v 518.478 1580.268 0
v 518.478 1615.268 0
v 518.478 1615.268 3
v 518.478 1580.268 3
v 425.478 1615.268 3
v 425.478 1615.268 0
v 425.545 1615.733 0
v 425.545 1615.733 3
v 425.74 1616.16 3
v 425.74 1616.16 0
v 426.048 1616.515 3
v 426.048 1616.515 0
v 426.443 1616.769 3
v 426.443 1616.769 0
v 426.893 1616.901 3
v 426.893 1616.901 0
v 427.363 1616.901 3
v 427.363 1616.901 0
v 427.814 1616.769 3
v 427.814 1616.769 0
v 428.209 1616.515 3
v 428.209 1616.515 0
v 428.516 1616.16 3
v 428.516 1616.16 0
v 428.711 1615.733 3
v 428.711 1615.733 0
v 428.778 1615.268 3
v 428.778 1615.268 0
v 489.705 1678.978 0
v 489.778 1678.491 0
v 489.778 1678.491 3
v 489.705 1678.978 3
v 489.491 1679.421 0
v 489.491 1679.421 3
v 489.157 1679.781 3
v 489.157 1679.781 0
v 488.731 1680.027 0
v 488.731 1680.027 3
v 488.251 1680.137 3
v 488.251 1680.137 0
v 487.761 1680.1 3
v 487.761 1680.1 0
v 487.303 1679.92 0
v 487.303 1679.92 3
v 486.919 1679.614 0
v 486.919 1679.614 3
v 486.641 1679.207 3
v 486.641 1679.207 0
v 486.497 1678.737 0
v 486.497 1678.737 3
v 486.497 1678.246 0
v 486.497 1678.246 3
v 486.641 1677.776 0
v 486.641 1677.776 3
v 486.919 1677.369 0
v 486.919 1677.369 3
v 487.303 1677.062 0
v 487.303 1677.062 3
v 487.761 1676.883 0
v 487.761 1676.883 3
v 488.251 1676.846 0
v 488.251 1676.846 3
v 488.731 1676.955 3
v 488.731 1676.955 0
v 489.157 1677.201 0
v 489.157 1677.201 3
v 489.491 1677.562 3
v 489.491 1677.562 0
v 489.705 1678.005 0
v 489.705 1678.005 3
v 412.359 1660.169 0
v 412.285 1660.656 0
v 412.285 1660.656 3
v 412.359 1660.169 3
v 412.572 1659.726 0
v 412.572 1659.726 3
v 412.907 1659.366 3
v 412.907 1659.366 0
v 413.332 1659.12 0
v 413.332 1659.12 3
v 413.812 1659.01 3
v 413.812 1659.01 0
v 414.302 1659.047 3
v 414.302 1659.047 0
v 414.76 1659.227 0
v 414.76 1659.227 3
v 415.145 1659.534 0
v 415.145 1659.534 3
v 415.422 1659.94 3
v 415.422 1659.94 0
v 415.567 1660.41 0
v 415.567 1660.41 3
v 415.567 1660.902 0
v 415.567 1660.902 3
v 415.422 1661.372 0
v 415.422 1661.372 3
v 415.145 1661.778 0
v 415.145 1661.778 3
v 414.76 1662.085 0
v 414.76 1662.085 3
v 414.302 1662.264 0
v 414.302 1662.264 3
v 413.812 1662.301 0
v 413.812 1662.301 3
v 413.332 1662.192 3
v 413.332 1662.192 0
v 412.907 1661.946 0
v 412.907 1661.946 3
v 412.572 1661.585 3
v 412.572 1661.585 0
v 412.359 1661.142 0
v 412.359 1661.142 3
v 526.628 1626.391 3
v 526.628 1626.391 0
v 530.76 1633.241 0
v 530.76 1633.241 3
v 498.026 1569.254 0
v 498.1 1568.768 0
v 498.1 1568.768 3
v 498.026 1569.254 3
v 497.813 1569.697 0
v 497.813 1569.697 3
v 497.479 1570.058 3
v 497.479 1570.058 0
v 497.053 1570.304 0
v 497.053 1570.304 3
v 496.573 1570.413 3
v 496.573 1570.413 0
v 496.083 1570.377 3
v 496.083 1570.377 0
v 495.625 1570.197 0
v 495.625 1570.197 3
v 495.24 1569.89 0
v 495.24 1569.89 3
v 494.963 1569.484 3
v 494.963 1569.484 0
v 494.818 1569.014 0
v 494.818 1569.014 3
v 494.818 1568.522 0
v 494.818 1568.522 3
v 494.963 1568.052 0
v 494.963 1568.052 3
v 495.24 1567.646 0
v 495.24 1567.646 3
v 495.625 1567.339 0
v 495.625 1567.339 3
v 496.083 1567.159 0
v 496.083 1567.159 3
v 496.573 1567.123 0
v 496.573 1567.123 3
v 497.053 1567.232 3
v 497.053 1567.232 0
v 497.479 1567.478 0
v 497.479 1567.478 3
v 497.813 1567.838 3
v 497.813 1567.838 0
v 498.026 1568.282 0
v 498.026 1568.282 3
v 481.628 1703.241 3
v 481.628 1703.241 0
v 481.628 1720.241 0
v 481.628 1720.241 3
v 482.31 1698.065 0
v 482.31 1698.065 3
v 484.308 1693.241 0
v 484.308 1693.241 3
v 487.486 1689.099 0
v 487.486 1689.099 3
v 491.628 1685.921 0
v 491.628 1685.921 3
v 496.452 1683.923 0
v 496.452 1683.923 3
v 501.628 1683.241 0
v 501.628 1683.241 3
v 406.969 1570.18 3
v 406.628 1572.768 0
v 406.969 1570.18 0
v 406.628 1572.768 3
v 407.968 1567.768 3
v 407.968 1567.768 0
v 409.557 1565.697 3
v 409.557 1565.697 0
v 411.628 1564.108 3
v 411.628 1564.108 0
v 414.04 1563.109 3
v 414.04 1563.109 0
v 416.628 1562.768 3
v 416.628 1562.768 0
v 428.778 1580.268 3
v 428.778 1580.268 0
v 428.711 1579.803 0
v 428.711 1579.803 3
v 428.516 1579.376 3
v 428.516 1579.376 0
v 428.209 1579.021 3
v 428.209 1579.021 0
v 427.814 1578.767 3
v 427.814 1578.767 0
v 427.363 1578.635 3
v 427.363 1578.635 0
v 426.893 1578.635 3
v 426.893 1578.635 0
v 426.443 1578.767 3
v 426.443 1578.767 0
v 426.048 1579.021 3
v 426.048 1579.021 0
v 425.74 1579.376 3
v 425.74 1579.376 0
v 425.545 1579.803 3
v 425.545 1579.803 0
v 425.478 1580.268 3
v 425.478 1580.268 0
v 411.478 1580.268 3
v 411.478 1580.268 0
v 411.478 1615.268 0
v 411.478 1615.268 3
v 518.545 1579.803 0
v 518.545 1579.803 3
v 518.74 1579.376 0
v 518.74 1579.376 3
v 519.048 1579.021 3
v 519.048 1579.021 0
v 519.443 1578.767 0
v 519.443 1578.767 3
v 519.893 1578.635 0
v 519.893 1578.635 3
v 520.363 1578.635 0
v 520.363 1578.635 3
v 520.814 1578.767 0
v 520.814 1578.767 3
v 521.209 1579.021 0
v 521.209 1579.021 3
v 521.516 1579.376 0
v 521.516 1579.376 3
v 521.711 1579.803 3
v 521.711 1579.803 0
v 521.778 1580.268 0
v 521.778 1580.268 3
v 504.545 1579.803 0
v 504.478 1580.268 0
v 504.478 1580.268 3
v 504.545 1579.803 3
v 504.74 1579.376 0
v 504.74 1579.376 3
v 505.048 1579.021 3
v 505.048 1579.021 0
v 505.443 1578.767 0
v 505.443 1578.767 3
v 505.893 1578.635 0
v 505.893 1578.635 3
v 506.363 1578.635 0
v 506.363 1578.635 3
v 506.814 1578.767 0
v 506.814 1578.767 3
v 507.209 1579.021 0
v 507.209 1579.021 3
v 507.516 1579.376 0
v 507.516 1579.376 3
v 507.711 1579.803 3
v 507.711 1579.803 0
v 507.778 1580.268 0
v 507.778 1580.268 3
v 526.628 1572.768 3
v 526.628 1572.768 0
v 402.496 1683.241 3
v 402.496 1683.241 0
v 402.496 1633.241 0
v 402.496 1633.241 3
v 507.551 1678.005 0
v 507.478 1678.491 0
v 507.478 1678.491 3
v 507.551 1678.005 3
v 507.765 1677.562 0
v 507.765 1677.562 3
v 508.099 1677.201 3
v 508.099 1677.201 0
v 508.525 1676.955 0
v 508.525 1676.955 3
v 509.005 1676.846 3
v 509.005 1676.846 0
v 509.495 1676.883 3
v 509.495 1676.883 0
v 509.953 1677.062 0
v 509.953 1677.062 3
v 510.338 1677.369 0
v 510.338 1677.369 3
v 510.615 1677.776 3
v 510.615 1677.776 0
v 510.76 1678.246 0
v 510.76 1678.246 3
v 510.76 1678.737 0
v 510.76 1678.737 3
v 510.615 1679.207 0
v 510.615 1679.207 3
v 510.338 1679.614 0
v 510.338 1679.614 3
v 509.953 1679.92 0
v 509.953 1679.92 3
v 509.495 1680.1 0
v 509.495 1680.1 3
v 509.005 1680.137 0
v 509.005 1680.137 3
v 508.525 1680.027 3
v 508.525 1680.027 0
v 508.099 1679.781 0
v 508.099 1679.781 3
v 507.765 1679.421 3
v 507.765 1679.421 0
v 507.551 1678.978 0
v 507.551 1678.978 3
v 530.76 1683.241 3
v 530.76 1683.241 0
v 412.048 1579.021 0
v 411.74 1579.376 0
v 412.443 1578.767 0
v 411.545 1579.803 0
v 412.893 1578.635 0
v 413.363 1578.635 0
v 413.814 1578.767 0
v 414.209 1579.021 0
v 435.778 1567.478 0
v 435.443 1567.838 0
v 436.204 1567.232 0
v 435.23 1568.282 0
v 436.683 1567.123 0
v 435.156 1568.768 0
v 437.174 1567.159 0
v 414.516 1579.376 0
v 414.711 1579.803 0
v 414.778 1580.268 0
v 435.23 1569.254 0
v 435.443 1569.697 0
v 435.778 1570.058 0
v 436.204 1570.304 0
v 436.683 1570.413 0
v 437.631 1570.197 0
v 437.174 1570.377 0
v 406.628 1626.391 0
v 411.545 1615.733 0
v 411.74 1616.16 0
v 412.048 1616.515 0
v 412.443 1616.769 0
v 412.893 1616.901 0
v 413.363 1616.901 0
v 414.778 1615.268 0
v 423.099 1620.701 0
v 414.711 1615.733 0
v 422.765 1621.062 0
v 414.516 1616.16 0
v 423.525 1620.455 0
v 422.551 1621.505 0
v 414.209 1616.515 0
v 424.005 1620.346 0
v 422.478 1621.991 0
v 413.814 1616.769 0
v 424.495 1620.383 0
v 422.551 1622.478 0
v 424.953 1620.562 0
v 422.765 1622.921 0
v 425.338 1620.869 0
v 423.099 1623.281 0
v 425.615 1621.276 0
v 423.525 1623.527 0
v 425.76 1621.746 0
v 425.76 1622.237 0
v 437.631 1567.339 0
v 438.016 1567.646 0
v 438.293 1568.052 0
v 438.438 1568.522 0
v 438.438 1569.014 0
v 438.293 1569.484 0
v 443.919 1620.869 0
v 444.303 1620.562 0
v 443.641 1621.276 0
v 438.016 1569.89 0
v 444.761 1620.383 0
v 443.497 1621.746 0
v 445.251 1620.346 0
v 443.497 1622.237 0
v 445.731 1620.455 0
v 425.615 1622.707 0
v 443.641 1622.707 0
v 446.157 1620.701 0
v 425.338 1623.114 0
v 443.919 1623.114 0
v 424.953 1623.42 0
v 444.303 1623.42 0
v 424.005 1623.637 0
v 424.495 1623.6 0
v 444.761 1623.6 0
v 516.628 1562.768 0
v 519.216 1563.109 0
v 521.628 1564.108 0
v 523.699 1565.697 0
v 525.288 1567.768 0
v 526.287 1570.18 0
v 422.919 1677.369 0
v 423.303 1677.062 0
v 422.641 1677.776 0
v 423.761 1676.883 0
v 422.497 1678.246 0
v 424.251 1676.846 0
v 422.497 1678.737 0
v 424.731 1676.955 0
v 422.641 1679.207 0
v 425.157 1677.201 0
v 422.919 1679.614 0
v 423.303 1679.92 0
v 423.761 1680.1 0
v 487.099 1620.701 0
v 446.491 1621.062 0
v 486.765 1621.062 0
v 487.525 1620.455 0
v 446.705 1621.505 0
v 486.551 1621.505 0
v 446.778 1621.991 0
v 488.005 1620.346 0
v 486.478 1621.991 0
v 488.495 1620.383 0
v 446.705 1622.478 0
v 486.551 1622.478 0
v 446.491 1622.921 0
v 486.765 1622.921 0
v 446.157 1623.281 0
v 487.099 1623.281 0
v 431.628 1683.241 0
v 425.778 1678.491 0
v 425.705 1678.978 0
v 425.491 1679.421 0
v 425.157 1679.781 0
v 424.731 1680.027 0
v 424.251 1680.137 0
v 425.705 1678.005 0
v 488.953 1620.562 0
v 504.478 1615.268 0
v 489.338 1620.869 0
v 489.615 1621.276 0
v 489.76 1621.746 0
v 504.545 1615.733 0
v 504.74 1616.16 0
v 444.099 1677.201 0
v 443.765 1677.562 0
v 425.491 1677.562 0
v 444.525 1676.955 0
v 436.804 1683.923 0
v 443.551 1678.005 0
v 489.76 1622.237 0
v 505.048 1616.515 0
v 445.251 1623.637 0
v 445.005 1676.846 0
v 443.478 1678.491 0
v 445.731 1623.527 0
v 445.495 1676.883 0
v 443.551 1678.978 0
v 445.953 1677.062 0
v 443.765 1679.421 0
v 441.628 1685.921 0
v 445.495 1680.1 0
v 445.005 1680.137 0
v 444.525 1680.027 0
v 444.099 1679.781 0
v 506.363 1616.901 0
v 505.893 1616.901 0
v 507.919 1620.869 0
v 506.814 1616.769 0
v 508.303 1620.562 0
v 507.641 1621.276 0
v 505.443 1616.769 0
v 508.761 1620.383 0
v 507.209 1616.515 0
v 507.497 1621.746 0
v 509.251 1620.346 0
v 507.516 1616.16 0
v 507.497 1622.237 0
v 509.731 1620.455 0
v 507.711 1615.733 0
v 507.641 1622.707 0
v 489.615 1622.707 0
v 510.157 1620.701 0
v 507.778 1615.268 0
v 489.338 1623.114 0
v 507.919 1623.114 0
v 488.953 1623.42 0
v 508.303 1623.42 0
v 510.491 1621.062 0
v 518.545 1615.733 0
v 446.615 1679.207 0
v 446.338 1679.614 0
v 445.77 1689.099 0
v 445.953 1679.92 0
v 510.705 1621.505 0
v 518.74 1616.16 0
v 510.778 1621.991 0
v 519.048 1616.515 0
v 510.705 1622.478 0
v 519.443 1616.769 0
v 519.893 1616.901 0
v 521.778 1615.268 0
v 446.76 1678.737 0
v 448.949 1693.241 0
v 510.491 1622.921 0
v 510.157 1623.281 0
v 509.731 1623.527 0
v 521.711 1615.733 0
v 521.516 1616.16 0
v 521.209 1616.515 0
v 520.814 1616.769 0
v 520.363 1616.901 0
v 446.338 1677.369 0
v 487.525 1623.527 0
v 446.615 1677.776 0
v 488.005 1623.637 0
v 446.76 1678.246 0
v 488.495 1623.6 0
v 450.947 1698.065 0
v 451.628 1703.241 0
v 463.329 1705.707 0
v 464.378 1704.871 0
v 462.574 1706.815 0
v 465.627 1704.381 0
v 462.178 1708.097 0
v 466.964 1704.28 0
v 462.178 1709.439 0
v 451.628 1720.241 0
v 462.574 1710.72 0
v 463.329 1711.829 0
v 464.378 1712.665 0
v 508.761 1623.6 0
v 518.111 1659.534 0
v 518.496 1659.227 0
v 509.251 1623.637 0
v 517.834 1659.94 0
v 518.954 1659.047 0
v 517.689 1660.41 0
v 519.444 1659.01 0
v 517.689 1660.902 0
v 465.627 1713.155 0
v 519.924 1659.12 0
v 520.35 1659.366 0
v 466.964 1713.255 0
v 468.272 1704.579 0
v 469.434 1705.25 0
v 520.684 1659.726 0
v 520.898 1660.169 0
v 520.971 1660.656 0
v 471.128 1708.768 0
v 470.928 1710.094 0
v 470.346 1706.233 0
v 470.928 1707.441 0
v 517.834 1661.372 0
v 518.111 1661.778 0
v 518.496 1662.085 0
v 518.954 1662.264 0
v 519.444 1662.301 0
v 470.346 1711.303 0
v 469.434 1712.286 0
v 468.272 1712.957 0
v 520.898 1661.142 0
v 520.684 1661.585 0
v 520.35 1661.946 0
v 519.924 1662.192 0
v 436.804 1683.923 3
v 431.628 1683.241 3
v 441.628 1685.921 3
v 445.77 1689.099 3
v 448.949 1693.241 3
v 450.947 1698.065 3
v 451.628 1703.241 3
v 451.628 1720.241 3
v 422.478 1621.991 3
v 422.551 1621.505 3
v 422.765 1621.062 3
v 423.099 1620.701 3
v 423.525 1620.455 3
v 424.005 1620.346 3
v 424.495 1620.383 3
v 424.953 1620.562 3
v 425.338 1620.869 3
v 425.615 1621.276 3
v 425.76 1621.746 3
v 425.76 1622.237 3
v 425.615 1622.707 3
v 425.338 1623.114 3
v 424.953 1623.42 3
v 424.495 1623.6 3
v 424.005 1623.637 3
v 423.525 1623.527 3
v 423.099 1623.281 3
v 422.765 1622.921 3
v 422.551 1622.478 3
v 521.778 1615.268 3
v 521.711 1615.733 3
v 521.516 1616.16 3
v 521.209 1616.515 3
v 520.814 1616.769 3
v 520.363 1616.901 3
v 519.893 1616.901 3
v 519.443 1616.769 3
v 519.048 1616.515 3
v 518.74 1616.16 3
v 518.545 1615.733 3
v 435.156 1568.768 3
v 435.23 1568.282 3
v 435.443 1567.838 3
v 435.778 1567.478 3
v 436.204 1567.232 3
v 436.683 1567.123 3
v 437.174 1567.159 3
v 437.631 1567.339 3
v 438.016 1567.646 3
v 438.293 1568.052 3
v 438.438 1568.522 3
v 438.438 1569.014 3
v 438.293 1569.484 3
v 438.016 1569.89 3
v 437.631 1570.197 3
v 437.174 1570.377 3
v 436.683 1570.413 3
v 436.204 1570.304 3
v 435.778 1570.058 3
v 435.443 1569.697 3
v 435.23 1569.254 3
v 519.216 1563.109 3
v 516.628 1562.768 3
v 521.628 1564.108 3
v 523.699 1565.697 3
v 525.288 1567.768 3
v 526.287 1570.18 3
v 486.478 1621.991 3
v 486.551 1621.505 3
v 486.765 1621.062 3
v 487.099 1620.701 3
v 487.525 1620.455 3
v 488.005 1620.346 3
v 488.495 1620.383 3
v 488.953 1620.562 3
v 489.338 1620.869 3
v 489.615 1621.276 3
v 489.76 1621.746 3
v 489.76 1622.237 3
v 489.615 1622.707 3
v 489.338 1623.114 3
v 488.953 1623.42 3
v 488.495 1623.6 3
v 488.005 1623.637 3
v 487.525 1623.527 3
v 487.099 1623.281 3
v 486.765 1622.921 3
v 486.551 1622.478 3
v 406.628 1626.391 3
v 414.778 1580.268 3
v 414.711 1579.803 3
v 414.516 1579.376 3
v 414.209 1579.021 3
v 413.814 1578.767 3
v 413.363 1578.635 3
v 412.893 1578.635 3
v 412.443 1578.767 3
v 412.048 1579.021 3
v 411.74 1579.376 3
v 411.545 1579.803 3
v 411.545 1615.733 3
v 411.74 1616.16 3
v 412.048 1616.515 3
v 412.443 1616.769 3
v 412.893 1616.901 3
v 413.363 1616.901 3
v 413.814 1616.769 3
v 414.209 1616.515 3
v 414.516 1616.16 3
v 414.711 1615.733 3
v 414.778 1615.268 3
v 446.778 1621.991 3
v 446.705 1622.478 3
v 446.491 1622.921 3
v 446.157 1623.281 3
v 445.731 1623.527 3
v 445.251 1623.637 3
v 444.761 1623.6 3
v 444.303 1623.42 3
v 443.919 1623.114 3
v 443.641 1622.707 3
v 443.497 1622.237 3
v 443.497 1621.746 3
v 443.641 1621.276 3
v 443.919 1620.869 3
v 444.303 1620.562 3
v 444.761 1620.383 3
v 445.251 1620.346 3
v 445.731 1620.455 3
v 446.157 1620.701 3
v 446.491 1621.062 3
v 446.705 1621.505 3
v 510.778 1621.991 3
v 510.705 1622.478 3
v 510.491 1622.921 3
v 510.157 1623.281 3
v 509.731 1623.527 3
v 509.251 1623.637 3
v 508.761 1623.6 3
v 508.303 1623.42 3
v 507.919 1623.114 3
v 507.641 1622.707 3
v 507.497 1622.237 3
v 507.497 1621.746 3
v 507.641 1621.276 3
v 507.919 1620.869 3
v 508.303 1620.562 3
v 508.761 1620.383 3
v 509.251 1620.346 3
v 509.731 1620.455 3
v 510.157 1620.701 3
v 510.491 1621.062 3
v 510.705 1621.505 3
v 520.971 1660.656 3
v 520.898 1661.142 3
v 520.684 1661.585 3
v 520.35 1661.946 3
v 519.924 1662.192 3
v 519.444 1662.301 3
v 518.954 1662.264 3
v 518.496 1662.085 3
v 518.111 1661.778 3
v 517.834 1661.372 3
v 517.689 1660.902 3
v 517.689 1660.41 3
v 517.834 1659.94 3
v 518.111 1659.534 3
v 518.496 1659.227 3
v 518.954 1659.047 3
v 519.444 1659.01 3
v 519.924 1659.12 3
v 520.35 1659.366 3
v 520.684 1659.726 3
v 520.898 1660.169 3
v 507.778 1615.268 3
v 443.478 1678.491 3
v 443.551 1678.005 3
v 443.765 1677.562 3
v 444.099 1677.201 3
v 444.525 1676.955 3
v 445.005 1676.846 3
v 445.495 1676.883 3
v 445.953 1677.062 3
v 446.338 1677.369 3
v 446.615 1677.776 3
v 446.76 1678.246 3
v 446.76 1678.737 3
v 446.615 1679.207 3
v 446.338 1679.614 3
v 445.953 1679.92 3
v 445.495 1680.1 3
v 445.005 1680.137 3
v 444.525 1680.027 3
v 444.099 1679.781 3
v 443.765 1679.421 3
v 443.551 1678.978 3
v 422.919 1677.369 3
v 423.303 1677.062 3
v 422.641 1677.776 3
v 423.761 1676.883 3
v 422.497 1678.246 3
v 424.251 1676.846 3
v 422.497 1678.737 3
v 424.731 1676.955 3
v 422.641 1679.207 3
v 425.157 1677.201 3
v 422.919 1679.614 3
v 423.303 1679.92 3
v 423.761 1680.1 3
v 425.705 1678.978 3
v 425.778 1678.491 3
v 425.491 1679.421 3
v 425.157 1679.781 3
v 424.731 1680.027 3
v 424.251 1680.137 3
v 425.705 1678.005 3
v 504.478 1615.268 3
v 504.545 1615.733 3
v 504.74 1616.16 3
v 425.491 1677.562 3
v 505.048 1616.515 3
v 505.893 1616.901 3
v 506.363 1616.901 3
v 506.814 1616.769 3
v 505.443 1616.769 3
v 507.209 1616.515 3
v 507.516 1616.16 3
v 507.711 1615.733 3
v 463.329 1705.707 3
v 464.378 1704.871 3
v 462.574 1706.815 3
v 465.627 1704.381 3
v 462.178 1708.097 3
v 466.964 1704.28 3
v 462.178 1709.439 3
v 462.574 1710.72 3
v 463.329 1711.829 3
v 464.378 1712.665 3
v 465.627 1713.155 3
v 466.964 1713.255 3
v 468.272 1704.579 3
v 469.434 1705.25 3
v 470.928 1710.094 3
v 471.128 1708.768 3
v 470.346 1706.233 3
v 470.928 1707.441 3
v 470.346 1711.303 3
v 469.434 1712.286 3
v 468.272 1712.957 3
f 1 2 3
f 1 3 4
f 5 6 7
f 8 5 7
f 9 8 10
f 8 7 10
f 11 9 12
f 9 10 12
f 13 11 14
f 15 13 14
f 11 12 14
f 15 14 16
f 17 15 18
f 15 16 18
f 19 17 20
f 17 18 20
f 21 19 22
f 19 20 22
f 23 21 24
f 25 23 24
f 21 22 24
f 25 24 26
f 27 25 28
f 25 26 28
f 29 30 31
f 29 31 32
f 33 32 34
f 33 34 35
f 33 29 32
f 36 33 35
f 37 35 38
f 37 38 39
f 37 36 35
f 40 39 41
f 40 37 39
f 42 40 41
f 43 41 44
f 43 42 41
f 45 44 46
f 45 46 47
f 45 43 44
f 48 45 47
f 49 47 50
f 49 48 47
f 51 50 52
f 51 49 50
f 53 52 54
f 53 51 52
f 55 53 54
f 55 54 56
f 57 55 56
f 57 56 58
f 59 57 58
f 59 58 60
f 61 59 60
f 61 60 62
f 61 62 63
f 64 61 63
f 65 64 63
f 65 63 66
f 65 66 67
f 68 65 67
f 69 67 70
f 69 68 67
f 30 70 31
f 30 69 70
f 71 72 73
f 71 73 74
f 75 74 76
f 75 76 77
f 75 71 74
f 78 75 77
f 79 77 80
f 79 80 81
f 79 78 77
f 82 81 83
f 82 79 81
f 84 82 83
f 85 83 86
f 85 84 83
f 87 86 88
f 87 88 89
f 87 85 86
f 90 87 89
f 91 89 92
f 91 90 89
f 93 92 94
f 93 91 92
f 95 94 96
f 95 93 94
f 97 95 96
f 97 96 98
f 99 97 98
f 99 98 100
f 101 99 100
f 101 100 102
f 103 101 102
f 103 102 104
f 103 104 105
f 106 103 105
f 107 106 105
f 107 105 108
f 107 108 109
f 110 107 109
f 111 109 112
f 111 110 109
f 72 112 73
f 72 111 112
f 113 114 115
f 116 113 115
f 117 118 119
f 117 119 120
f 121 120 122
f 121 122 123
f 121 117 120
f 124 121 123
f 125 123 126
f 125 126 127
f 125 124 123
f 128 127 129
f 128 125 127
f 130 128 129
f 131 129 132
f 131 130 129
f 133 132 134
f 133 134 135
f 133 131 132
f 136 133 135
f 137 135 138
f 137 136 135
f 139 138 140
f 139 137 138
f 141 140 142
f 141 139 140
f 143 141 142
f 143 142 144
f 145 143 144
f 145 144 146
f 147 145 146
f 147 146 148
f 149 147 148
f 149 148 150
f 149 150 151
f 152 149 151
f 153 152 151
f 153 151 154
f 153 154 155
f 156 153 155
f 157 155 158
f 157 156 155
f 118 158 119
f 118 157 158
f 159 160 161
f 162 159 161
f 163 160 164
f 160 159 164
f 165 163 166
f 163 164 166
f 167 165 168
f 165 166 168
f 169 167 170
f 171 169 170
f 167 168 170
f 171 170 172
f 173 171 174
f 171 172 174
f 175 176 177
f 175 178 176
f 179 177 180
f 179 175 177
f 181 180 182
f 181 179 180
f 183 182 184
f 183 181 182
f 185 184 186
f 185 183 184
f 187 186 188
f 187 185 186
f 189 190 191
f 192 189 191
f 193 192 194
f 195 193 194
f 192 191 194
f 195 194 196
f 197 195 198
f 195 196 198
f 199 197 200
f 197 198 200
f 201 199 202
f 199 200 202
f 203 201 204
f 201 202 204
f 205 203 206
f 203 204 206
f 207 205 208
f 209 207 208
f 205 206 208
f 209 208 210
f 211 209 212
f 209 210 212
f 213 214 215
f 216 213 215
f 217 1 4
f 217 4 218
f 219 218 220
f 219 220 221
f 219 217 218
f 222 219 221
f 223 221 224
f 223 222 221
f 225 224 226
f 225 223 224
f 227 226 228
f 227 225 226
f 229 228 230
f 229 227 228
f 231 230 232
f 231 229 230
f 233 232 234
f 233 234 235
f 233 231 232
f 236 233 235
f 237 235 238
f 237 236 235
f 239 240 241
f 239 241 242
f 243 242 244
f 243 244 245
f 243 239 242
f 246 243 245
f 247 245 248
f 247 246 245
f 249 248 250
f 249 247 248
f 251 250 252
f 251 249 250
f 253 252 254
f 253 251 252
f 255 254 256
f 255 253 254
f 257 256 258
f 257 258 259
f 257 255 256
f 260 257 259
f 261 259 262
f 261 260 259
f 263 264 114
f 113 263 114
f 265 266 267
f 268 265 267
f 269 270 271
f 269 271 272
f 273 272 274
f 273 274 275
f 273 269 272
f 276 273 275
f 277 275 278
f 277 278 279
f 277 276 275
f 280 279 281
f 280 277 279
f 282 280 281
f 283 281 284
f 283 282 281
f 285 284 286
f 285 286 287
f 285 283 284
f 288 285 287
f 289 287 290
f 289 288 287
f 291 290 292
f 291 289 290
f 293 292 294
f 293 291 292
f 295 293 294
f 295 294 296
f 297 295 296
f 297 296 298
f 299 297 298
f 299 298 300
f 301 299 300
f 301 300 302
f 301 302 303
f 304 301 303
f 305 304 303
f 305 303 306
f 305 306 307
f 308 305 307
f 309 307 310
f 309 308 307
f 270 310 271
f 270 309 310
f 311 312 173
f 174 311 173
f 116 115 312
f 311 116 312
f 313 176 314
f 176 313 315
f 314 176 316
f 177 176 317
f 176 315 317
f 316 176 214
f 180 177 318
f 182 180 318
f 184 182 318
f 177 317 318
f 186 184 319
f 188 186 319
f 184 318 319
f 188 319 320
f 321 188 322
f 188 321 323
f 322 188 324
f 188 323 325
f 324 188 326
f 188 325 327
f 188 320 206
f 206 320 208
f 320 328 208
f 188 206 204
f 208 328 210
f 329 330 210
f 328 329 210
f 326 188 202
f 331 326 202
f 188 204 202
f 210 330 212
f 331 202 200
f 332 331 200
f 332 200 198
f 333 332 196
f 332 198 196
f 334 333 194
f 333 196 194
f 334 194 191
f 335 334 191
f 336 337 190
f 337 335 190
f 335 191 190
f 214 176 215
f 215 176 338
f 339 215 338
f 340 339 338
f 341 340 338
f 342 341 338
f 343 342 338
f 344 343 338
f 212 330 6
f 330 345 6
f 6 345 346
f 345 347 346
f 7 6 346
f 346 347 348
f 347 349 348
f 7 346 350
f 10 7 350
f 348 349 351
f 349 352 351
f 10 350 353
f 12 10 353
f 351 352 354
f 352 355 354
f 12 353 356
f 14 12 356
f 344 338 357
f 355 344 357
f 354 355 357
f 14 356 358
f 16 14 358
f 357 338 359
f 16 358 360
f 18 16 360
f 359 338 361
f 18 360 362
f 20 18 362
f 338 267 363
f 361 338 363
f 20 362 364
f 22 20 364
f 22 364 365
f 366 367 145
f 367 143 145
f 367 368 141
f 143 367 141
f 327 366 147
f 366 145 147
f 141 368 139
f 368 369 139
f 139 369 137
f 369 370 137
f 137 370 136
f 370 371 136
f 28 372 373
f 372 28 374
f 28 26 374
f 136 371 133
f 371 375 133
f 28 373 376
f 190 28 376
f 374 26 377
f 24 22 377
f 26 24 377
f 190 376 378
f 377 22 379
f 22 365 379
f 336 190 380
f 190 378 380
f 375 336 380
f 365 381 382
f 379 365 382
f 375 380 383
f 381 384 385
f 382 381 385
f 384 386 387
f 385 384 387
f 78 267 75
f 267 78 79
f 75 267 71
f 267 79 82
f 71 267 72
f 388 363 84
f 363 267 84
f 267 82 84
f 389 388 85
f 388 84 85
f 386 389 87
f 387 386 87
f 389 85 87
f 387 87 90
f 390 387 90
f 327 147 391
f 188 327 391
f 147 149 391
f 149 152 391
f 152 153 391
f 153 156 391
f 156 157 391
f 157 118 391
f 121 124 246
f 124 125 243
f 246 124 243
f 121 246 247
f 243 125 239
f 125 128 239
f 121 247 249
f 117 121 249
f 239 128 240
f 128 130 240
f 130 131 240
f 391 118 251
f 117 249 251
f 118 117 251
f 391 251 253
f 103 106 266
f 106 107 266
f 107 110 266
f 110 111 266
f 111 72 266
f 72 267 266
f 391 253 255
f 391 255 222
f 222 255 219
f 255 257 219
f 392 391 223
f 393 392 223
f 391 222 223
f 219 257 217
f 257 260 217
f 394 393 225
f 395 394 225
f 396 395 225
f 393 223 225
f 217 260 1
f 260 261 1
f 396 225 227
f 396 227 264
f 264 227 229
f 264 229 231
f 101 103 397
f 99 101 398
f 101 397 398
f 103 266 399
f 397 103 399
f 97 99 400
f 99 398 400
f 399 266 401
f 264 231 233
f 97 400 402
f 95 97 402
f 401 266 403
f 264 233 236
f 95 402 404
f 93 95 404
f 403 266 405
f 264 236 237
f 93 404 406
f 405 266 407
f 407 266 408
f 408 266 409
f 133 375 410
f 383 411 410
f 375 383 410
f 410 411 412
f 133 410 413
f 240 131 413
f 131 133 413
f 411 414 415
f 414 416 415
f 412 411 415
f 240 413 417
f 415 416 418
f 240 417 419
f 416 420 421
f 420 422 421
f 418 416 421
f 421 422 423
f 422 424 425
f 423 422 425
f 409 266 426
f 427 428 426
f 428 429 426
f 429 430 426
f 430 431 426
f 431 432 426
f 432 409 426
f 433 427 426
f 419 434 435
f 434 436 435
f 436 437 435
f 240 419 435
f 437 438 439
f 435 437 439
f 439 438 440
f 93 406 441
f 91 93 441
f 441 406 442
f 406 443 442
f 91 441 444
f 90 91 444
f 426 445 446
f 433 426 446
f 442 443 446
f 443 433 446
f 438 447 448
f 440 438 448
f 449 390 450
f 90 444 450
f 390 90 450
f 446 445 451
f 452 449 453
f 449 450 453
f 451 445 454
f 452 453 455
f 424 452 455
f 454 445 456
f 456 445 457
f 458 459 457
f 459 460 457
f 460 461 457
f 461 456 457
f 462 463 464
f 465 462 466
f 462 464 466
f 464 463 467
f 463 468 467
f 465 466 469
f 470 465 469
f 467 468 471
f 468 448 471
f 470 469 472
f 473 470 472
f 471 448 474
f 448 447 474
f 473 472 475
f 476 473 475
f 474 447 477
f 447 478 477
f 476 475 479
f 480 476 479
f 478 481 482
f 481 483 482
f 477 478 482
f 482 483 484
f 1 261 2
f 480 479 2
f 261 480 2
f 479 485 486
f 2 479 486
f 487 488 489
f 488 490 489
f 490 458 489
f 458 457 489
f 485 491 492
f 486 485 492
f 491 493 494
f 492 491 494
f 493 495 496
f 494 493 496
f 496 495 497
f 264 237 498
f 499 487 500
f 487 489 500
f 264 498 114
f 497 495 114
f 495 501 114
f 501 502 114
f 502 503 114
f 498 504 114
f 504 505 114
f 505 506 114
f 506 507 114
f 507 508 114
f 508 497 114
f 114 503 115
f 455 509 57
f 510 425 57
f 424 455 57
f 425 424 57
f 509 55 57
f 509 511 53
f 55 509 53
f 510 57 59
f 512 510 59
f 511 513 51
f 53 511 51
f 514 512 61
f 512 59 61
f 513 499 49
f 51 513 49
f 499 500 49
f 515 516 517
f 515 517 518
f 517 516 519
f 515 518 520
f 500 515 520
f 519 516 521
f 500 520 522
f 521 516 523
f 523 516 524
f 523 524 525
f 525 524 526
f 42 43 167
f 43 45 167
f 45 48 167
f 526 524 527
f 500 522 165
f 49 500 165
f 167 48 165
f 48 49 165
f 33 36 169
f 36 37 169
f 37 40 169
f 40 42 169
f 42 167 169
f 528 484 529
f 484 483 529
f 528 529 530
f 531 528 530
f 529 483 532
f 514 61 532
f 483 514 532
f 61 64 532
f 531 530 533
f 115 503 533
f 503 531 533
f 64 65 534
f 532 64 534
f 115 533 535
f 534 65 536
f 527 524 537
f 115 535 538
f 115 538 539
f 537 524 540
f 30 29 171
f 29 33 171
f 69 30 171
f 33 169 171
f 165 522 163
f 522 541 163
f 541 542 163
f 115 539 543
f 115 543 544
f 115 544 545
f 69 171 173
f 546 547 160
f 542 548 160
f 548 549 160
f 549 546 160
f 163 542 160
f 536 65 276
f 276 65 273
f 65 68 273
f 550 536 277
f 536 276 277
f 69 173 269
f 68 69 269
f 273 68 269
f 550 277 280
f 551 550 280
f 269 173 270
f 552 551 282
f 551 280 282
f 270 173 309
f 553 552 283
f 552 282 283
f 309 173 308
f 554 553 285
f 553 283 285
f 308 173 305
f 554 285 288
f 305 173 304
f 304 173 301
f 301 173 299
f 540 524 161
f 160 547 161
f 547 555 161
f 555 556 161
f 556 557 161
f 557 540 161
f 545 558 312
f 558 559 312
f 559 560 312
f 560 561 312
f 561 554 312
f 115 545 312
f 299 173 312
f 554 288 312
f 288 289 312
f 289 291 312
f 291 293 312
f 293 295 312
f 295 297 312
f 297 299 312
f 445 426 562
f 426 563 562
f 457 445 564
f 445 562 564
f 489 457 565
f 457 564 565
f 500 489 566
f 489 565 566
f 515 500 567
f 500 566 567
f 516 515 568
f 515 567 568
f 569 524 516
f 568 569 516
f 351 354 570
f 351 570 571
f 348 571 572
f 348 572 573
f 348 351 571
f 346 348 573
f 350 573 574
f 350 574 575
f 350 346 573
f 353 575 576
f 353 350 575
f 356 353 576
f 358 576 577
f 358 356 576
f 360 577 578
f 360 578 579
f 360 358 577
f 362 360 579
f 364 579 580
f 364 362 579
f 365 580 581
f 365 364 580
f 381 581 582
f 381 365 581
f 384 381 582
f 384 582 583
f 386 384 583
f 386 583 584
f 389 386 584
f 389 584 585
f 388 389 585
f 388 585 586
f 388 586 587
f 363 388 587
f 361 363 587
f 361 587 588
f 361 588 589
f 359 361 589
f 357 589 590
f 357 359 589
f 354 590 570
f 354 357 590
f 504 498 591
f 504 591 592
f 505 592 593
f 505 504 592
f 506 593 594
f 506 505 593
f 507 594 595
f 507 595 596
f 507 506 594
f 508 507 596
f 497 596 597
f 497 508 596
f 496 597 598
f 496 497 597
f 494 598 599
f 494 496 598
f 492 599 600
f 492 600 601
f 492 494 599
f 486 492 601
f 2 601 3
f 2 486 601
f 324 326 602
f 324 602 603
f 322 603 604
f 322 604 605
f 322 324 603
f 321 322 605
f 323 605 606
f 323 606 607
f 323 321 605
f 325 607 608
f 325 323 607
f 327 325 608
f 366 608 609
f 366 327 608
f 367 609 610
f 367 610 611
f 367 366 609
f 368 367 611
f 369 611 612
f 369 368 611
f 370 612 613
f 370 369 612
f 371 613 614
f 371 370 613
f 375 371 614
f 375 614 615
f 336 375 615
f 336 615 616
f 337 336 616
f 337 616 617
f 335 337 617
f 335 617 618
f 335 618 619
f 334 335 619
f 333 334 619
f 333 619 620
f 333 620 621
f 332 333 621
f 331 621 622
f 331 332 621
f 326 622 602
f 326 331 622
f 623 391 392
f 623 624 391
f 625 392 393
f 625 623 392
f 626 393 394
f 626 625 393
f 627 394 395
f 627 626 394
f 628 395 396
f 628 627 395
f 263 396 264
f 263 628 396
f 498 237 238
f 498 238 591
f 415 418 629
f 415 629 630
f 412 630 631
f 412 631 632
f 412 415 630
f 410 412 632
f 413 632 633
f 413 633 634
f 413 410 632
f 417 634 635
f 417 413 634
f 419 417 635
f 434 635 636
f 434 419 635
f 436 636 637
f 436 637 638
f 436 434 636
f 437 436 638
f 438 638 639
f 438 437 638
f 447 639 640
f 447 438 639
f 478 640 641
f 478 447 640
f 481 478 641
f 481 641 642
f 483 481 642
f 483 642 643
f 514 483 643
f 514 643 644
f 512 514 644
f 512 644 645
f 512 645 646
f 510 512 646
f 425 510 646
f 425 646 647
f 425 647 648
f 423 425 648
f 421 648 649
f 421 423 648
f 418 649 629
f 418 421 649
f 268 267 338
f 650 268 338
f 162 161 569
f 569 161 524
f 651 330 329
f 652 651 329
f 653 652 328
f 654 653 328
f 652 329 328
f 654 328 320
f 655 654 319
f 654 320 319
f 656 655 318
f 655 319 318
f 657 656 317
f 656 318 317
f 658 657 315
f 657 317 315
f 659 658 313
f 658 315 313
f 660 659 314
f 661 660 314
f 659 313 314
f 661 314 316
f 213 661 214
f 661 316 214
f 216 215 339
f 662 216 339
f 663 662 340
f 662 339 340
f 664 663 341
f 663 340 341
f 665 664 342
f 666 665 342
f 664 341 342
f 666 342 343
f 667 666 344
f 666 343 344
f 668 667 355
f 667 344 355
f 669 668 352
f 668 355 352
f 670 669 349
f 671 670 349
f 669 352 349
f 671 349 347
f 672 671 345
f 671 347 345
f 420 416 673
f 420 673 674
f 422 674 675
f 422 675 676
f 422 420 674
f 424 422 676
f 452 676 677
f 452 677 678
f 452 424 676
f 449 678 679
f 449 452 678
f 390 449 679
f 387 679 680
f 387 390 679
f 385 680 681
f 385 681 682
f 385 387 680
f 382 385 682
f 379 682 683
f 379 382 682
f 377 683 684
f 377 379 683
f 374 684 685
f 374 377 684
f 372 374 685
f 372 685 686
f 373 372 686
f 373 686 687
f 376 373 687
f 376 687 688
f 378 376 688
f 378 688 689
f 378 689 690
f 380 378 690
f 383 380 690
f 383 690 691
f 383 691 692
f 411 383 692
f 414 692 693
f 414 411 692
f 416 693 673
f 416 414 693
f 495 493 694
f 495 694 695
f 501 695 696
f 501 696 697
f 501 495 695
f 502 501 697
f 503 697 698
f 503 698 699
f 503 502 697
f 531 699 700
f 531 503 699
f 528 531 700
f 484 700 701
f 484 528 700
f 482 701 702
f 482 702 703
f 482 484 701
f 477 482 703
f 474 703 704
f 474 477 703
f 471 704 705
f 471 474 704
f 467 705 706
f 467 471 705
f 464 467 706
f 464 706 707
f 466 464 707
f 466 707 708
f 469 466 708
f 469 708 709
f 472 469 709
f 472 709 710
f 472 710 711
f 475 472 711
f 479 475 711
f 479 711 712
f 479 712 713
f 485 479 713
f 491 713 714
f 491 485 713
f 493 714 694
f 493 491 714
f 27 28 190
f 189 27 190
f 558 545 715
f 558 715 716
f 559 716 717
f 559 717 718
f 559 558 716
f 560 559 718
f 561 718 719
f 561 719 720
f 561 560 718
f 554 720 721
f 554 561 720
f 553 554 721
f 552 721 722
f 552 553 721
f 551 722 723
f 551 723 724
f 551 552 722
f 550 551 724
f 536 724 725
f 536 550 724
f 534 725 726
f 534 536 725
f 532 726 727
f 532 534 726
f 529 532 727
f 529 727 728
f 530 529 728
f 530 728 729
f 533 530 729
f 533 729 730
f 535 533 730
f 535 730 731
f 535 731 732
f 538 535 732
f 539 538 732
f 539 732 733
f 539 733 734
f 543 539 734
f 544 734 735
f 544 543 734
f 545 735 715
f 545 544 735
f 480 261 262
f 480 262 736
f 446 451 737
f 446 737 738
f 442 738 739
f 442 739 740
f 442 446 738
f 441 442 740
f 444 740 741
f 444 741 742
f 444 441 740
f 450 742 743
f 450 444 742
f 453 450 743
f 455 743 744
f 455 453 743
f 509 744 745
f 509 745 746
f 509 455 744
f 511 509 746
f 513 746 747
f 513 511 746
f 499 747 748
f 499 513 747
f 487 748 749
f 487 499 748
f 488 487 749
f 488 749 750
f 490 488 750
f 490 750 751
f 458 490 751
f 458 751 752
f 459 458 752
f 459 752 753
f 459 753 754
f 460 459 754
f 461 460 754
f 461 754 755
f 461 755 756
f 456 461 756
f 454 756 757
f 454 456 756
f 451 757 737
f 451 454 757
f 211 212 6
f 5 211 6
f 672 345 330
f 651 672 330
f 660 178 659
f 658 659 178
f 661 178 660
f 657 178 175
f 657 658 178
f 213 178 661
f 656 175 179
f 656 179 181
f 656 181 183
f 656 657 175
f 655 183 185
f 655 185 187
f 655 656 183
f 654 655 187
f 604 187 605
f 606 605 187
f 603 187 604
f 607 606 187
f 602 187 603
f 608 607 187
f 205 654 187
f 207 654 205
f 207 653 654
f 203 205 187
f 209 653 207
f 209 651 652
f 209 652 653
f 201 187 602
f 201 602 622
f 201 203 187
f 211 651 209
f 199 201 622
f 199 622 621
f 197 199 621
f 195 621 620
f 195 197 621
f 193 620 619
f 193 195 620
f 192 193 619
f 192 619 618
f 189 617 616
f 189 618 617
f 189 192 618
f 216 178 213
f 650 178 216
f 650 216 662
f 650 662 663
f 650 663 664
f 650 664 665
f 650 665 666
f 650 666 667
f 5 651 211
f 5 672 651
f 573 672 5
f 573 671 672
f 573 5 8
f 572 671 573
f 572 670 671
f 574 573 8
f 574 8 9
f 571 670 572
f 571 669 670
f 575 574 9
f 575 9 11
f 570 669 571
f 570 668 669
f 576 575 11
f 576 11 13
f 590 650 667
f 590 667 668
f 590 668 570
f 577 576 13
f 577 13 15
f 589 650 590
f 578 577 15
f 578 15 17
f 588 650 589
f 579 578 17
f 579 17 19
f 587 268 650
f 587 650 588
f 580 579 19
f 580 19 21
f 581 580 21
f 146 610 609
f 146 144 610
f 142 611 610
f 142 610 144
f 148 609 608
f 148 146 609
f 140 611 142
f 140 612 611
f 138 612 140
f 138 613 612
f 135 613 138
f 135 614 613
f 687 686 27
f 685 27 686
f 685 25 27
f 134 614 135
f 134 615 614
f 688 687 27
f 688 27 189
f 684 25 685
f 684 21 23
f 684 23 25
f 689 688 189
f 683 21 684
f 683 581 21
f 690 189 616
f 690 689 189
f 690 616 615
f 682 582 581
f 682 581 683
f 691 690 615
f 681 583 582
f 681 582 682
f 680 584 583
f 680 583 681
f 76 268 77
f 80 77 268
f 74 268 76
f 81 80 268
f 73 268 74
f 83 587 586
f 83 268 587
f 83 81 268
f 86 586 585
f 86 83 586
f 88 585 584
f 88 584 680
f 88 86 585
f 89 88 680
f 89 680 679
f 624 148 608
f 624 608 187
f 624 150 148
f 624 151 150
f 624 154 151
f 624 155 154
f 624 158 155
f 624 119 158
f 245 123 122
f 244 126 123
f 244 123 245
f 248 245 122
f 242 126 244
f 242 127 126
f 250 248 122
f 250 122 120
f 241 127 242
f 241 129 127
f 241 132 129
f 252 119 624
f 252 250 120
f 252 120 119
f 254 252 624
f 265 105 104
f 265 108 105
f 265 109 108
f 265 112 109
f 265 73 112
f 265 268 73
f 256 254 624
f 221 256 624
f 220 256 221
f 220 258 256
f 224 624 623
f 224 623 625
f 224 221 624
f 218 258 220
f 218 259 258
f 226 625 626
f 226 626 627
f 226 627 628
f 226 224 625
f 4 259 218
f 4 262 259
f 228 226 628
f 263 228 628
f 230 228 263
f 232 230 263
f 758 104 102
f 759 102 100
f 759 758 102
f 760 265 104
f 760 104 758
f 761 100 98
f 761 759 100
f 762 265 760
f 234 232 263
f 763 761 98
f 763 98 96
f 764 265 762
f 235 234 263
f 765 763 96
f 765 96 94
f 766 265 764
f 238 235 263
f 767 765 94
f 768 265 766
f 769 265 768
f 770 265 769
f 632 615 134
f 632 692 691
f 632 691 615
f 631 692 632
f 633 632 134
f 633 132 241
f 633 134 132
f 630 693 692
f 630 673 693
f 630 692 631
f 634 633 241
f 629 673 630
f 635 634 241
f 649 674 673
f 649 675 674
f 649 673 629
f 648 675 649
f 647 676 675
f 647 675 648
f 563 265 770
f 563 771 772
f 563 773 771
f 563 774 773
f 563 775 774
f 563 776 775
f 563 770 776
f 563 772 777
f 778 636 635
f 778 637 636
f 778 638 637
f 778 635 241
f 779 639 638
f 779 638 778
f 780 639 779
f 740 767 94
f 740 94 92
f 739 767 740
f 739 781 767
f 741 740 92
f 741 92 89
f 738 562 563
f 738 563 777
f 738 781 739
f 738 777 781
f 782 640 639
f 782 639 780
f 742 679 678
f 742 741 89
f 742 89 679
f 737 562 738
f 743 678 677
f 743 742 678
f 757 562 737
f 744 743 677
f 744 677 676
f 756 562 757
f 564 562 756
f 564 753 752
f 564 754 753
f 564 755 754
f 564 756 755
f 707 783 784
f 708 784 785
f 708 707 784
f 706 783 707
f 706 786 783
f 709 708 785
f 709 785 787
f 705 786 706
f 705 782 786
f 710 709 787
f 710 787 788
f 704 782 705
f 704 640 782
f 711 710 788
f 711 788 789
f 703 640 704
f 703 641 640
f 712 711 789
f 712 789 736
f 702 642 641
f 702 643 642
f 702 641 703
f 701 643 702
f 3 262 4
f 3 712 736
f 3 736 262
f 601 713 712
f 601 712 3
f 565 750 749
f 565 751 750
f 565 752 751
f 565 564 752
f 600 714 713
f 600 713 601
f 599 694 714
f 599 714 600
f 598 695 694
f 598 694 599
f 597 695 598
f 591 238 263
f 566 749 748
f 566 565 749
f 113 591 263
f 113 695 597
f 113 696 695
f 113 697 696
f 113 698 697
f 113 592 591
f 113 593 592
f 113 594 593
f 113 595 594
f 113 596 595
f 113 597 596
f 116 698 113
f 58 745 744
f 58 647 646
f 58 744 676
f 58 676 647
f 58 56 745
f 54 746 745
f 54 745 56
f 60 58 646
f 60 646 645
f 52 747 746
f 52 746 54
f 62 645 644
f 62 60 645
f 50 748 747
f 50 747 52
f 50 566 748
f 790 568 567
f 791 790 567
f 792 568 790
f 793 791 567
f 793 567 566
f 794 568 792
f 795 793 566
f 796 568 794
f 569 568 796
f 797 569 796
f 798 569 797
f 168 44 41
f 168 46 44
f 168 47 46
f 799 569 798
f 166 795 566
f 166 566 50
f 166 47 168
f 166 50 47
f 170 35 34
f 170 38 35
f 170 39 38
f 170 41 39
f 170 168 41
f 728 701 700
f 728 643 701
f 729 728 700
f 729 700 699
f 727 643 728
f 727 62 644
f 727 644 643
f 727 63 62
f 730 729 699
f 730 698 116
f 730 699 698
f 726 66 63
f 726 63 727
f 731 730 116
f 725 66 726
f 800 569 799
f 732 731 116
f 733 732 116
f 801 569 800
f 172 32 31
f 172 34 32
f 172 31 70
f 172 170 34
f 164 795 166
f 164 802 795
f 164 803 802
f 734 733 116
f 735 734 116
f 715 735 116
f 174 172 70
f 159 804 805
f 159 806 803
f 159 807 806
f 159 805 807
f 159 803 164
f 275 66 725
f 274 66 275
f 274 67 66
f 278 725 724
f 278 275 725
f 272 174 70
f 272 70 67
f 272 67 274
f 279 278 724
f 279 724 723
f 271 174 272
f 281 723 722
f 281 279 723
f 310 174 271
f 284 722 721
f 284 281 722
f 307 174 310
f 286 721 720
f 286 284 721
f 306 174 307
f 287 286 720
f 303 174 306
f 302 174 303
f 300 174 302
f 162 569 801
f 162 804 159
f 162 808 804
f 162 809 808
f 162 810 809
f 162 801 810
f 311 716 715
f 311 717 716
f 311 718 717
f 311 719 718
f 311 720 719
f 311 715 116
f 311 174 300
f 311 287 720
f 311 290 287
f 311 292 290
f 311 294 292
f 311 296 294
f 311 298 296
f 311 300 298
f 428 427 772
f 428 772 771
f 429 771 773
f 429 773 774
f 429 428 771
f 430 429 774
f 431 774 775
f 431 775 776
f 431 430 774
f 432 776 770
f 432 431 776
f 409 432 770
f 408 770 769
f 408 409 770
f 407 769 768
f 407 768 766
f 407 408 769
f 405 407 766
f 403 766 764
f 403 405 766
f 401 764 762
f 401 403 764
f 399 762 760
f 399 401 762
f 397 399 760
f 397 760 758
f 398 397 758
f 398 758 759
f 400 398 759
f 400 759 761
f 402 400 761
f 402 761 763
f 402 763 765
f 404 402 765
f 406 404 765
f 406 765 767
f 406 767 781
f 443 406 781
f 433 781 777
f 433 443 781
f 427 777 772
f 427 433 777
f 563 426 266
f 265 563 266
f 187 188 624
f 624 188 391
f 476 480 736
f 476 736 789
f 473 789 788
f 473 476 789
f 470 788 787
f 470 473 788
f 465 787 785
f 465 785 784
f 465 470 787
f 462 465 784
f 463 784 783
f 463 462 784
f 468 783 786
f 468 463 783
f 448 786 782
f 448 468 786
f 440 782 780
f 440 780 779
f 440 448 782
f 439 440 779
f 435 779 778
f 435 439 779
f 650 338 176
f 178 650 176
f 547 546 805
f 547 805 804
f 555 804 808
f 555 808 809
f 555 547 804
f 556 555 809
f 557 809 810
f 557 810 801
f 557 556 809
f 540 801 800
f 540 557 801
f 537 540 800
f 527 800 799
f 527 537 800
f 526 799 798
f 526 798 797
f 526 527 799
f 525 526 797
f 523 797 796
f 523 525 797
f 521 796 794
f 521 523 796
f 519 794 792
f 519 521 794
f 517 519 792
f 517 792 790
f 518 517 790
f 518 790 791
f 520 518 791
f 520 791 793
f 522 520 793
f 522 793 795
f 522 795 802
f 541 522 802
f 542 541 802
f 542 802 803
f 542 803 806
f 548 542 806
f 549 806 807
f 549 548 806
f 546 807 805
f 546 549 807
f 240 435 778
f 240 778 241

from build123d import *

# Parameters (mm, degrees)
SKETCH1_R           = 4.5
SKETCH1_R_2         = 1.65
BOSS_EXTRUDE1_DEPTH = 3
FILLET3_R           = 20
FILLET4_R           = 10


with BuildPart() as part:
    # Sketch1 → Boss-Extrude1 (new body)
    with BuildSketch(Plane.XY):
        Polygon((402.495772407, 1683.241435849), (402.495772407, 1633.241435849), (406.628072987, 1626.391319652), (406.628072987, 1562.767892621), (526.628072987, 1562.767892621), (526.628072987, 1626.391319652), (530.760373568, 1633.241435849), (530.760373568, 1683.241435849), (481.628072987, 1683.241435849), (481.628072987, 1720.241435849), (451.628072987, 1720.241435849), (451.628072987, 1683.241435849), align=None)
        with Locations((466.628072987, 1708.767892621)):
            Circle(SKETCH1_R, mode=Mode.SUBTRACT)
        with Locations((519.320878863, 1660.655786173)):
            Circle(SKETCH1_R_2, mode=Mode.SUBTRACT)
        with Locations((496.449751686, 1568.767892621)):
            Circle(SKETCH1_R_2, mode=Mode.SUBTRACT)
        with Locations(Location((413.935267112, 1660.655786173, 0), (0, 0, 180))):
            Circle(SKETCH1_R_2, mode=Mode.SUBTRACT)
        with Locations(Location((436.806394289, 1568.767892621, 0), (0, 0, 180))):
            Circle(SKETCH1_R_2, mode=Mode.SUBTRACT)
        with Locations((488.128072987, 1678.491435849)):
            Circle(SKETCH1_R_2, mode=Mode.SUBTRACT)
        with Locations(Location((509.128072987, 1678.491435849, 0), (0, 0, 180))):
            Circle(SKETCH1_R_2, mode=Mode.SUBTRACT)
        with Locations(Location((488.128072987, 1621.991435849, 0), (0, 0, 180))):
            Circle(SKETCH1_R_2, mode=Mode.SUBTRACT)
        with Locations((509.128072987, 1621.991435849)):
            Circle(SKETCH1_R_2, mode=Mode.SUBTRACT)
        with Locations(Location((424.128072987, 1621.991435849, 0), (0, 0, 180))):
            Circle(SKETCH1_R_2, mode=Mode.SUBTRACT)
        with Locations((424.128072987, 1678.491435849)):
            Circle(SKETCH1_R_2, mode=Mode.SUBTRACT)
        with Locations(Location((445.128072987, 1678.491435849, 0), (0, 0, 180))):
            Circle(SKETCH1_R_2, mode=Mode.SUBTRACT)
        with Locations((445.128072987, 1621.991435849)):
            Circle(SKETCH1_R_2, mode=Mode.SUBTRACT)
        with BuildLine():
            Line((414.778072987, 1615.267892621), (414.778072987, 1580.267892621))
            ThreePointArc((414.778072987, 1580.267892621), (413.128072987, 1578.617892621), (411.478072987, 1580.267892621))
            Line((411.478072987, 1580.267892621), (411.478072987, 1615.267892621))
            ThreePointArc((411.478072987, 1615.267892621), (413.128072987, 1616.917892621), (414.778072987, 1615.267892621))
        make_face(mode=Mode.SUBTRACT)
        with BuildLine():
            Line((518.478072987, 1615.267892621), (518.478072987, 1580.267892621))
            ThreePointArc((518.478072987, 1580.267892621), (520.128072987, 1578.617892621), (521.778072987, 1580.267892621))
            Line((521.778072987, 1580.267892621), (521.778072987, 1615.267892621))
            ThreePointArc((521.778072987, 1615.267892621), (520.128072987, 1616.917892621), (518.478072987, 1615.267892621))
        make_face(mode=Mode.SUBTRACT)
        with BuildLine():
            Line((428.778072987, 1615.267892621), (428.778072987, 1580.267892621))
            ThreePointArc((428.778072987, 1580.267892621), (427.128072987, 1578.617892621), (425.478072987, 1580.267892621))
            Line((425.478072987, 1580.267892621), (425.478072987, 1615.267892621))
            ThreePointArc((425.478072987, 1615.267892621), (427.128072987, 1616.917892621), (428.778072987, 1615.267892621))
        make_face(mode=Mode.SUBTRACT)
        with BuildLine():
            Line((504.478072987, 1615.267892621), (504.478072987, 1580.267892621))
            ThreePointArc((504.478072987, 1580.267892621), (506.128072987, 1578.617892621), (507.778072987, 1580.267892621))
            Line((507.778072987, 1580.267892621), (507.778072987, 1615.267892621))
            ThreePointArc((507.778072987, 1615.267892621), (506.128072987, 1616.917892621), (504.478072987, 1615.267892621))
        make_face(mode=Mode.SUBTRACT)
    extrude(amount=BOSS_EXTRUDE1_DEPTH)

    # Fillet3
    fillet3_edges = [part.edges().sort_by_distance(p)[0] for p in [
        (481.628072987, 1683.241435849, 1.5),
        (451.628072987, 1683.241435849, 1.5),
    ]]
    fillet(fillet3_edges, radius=FILLET3_R)

    # Fillet4
    fillet4_edges = [part.edges().sort_by_distance(p)[0] for p in [
        (526.628072987, 1562.767892621, 1.5),
        (406.628072987, 1562.767892621, 1.5),
    ]]
    fillet(fillet4_edges, radius=FILLET4_R)


solid = part.part
